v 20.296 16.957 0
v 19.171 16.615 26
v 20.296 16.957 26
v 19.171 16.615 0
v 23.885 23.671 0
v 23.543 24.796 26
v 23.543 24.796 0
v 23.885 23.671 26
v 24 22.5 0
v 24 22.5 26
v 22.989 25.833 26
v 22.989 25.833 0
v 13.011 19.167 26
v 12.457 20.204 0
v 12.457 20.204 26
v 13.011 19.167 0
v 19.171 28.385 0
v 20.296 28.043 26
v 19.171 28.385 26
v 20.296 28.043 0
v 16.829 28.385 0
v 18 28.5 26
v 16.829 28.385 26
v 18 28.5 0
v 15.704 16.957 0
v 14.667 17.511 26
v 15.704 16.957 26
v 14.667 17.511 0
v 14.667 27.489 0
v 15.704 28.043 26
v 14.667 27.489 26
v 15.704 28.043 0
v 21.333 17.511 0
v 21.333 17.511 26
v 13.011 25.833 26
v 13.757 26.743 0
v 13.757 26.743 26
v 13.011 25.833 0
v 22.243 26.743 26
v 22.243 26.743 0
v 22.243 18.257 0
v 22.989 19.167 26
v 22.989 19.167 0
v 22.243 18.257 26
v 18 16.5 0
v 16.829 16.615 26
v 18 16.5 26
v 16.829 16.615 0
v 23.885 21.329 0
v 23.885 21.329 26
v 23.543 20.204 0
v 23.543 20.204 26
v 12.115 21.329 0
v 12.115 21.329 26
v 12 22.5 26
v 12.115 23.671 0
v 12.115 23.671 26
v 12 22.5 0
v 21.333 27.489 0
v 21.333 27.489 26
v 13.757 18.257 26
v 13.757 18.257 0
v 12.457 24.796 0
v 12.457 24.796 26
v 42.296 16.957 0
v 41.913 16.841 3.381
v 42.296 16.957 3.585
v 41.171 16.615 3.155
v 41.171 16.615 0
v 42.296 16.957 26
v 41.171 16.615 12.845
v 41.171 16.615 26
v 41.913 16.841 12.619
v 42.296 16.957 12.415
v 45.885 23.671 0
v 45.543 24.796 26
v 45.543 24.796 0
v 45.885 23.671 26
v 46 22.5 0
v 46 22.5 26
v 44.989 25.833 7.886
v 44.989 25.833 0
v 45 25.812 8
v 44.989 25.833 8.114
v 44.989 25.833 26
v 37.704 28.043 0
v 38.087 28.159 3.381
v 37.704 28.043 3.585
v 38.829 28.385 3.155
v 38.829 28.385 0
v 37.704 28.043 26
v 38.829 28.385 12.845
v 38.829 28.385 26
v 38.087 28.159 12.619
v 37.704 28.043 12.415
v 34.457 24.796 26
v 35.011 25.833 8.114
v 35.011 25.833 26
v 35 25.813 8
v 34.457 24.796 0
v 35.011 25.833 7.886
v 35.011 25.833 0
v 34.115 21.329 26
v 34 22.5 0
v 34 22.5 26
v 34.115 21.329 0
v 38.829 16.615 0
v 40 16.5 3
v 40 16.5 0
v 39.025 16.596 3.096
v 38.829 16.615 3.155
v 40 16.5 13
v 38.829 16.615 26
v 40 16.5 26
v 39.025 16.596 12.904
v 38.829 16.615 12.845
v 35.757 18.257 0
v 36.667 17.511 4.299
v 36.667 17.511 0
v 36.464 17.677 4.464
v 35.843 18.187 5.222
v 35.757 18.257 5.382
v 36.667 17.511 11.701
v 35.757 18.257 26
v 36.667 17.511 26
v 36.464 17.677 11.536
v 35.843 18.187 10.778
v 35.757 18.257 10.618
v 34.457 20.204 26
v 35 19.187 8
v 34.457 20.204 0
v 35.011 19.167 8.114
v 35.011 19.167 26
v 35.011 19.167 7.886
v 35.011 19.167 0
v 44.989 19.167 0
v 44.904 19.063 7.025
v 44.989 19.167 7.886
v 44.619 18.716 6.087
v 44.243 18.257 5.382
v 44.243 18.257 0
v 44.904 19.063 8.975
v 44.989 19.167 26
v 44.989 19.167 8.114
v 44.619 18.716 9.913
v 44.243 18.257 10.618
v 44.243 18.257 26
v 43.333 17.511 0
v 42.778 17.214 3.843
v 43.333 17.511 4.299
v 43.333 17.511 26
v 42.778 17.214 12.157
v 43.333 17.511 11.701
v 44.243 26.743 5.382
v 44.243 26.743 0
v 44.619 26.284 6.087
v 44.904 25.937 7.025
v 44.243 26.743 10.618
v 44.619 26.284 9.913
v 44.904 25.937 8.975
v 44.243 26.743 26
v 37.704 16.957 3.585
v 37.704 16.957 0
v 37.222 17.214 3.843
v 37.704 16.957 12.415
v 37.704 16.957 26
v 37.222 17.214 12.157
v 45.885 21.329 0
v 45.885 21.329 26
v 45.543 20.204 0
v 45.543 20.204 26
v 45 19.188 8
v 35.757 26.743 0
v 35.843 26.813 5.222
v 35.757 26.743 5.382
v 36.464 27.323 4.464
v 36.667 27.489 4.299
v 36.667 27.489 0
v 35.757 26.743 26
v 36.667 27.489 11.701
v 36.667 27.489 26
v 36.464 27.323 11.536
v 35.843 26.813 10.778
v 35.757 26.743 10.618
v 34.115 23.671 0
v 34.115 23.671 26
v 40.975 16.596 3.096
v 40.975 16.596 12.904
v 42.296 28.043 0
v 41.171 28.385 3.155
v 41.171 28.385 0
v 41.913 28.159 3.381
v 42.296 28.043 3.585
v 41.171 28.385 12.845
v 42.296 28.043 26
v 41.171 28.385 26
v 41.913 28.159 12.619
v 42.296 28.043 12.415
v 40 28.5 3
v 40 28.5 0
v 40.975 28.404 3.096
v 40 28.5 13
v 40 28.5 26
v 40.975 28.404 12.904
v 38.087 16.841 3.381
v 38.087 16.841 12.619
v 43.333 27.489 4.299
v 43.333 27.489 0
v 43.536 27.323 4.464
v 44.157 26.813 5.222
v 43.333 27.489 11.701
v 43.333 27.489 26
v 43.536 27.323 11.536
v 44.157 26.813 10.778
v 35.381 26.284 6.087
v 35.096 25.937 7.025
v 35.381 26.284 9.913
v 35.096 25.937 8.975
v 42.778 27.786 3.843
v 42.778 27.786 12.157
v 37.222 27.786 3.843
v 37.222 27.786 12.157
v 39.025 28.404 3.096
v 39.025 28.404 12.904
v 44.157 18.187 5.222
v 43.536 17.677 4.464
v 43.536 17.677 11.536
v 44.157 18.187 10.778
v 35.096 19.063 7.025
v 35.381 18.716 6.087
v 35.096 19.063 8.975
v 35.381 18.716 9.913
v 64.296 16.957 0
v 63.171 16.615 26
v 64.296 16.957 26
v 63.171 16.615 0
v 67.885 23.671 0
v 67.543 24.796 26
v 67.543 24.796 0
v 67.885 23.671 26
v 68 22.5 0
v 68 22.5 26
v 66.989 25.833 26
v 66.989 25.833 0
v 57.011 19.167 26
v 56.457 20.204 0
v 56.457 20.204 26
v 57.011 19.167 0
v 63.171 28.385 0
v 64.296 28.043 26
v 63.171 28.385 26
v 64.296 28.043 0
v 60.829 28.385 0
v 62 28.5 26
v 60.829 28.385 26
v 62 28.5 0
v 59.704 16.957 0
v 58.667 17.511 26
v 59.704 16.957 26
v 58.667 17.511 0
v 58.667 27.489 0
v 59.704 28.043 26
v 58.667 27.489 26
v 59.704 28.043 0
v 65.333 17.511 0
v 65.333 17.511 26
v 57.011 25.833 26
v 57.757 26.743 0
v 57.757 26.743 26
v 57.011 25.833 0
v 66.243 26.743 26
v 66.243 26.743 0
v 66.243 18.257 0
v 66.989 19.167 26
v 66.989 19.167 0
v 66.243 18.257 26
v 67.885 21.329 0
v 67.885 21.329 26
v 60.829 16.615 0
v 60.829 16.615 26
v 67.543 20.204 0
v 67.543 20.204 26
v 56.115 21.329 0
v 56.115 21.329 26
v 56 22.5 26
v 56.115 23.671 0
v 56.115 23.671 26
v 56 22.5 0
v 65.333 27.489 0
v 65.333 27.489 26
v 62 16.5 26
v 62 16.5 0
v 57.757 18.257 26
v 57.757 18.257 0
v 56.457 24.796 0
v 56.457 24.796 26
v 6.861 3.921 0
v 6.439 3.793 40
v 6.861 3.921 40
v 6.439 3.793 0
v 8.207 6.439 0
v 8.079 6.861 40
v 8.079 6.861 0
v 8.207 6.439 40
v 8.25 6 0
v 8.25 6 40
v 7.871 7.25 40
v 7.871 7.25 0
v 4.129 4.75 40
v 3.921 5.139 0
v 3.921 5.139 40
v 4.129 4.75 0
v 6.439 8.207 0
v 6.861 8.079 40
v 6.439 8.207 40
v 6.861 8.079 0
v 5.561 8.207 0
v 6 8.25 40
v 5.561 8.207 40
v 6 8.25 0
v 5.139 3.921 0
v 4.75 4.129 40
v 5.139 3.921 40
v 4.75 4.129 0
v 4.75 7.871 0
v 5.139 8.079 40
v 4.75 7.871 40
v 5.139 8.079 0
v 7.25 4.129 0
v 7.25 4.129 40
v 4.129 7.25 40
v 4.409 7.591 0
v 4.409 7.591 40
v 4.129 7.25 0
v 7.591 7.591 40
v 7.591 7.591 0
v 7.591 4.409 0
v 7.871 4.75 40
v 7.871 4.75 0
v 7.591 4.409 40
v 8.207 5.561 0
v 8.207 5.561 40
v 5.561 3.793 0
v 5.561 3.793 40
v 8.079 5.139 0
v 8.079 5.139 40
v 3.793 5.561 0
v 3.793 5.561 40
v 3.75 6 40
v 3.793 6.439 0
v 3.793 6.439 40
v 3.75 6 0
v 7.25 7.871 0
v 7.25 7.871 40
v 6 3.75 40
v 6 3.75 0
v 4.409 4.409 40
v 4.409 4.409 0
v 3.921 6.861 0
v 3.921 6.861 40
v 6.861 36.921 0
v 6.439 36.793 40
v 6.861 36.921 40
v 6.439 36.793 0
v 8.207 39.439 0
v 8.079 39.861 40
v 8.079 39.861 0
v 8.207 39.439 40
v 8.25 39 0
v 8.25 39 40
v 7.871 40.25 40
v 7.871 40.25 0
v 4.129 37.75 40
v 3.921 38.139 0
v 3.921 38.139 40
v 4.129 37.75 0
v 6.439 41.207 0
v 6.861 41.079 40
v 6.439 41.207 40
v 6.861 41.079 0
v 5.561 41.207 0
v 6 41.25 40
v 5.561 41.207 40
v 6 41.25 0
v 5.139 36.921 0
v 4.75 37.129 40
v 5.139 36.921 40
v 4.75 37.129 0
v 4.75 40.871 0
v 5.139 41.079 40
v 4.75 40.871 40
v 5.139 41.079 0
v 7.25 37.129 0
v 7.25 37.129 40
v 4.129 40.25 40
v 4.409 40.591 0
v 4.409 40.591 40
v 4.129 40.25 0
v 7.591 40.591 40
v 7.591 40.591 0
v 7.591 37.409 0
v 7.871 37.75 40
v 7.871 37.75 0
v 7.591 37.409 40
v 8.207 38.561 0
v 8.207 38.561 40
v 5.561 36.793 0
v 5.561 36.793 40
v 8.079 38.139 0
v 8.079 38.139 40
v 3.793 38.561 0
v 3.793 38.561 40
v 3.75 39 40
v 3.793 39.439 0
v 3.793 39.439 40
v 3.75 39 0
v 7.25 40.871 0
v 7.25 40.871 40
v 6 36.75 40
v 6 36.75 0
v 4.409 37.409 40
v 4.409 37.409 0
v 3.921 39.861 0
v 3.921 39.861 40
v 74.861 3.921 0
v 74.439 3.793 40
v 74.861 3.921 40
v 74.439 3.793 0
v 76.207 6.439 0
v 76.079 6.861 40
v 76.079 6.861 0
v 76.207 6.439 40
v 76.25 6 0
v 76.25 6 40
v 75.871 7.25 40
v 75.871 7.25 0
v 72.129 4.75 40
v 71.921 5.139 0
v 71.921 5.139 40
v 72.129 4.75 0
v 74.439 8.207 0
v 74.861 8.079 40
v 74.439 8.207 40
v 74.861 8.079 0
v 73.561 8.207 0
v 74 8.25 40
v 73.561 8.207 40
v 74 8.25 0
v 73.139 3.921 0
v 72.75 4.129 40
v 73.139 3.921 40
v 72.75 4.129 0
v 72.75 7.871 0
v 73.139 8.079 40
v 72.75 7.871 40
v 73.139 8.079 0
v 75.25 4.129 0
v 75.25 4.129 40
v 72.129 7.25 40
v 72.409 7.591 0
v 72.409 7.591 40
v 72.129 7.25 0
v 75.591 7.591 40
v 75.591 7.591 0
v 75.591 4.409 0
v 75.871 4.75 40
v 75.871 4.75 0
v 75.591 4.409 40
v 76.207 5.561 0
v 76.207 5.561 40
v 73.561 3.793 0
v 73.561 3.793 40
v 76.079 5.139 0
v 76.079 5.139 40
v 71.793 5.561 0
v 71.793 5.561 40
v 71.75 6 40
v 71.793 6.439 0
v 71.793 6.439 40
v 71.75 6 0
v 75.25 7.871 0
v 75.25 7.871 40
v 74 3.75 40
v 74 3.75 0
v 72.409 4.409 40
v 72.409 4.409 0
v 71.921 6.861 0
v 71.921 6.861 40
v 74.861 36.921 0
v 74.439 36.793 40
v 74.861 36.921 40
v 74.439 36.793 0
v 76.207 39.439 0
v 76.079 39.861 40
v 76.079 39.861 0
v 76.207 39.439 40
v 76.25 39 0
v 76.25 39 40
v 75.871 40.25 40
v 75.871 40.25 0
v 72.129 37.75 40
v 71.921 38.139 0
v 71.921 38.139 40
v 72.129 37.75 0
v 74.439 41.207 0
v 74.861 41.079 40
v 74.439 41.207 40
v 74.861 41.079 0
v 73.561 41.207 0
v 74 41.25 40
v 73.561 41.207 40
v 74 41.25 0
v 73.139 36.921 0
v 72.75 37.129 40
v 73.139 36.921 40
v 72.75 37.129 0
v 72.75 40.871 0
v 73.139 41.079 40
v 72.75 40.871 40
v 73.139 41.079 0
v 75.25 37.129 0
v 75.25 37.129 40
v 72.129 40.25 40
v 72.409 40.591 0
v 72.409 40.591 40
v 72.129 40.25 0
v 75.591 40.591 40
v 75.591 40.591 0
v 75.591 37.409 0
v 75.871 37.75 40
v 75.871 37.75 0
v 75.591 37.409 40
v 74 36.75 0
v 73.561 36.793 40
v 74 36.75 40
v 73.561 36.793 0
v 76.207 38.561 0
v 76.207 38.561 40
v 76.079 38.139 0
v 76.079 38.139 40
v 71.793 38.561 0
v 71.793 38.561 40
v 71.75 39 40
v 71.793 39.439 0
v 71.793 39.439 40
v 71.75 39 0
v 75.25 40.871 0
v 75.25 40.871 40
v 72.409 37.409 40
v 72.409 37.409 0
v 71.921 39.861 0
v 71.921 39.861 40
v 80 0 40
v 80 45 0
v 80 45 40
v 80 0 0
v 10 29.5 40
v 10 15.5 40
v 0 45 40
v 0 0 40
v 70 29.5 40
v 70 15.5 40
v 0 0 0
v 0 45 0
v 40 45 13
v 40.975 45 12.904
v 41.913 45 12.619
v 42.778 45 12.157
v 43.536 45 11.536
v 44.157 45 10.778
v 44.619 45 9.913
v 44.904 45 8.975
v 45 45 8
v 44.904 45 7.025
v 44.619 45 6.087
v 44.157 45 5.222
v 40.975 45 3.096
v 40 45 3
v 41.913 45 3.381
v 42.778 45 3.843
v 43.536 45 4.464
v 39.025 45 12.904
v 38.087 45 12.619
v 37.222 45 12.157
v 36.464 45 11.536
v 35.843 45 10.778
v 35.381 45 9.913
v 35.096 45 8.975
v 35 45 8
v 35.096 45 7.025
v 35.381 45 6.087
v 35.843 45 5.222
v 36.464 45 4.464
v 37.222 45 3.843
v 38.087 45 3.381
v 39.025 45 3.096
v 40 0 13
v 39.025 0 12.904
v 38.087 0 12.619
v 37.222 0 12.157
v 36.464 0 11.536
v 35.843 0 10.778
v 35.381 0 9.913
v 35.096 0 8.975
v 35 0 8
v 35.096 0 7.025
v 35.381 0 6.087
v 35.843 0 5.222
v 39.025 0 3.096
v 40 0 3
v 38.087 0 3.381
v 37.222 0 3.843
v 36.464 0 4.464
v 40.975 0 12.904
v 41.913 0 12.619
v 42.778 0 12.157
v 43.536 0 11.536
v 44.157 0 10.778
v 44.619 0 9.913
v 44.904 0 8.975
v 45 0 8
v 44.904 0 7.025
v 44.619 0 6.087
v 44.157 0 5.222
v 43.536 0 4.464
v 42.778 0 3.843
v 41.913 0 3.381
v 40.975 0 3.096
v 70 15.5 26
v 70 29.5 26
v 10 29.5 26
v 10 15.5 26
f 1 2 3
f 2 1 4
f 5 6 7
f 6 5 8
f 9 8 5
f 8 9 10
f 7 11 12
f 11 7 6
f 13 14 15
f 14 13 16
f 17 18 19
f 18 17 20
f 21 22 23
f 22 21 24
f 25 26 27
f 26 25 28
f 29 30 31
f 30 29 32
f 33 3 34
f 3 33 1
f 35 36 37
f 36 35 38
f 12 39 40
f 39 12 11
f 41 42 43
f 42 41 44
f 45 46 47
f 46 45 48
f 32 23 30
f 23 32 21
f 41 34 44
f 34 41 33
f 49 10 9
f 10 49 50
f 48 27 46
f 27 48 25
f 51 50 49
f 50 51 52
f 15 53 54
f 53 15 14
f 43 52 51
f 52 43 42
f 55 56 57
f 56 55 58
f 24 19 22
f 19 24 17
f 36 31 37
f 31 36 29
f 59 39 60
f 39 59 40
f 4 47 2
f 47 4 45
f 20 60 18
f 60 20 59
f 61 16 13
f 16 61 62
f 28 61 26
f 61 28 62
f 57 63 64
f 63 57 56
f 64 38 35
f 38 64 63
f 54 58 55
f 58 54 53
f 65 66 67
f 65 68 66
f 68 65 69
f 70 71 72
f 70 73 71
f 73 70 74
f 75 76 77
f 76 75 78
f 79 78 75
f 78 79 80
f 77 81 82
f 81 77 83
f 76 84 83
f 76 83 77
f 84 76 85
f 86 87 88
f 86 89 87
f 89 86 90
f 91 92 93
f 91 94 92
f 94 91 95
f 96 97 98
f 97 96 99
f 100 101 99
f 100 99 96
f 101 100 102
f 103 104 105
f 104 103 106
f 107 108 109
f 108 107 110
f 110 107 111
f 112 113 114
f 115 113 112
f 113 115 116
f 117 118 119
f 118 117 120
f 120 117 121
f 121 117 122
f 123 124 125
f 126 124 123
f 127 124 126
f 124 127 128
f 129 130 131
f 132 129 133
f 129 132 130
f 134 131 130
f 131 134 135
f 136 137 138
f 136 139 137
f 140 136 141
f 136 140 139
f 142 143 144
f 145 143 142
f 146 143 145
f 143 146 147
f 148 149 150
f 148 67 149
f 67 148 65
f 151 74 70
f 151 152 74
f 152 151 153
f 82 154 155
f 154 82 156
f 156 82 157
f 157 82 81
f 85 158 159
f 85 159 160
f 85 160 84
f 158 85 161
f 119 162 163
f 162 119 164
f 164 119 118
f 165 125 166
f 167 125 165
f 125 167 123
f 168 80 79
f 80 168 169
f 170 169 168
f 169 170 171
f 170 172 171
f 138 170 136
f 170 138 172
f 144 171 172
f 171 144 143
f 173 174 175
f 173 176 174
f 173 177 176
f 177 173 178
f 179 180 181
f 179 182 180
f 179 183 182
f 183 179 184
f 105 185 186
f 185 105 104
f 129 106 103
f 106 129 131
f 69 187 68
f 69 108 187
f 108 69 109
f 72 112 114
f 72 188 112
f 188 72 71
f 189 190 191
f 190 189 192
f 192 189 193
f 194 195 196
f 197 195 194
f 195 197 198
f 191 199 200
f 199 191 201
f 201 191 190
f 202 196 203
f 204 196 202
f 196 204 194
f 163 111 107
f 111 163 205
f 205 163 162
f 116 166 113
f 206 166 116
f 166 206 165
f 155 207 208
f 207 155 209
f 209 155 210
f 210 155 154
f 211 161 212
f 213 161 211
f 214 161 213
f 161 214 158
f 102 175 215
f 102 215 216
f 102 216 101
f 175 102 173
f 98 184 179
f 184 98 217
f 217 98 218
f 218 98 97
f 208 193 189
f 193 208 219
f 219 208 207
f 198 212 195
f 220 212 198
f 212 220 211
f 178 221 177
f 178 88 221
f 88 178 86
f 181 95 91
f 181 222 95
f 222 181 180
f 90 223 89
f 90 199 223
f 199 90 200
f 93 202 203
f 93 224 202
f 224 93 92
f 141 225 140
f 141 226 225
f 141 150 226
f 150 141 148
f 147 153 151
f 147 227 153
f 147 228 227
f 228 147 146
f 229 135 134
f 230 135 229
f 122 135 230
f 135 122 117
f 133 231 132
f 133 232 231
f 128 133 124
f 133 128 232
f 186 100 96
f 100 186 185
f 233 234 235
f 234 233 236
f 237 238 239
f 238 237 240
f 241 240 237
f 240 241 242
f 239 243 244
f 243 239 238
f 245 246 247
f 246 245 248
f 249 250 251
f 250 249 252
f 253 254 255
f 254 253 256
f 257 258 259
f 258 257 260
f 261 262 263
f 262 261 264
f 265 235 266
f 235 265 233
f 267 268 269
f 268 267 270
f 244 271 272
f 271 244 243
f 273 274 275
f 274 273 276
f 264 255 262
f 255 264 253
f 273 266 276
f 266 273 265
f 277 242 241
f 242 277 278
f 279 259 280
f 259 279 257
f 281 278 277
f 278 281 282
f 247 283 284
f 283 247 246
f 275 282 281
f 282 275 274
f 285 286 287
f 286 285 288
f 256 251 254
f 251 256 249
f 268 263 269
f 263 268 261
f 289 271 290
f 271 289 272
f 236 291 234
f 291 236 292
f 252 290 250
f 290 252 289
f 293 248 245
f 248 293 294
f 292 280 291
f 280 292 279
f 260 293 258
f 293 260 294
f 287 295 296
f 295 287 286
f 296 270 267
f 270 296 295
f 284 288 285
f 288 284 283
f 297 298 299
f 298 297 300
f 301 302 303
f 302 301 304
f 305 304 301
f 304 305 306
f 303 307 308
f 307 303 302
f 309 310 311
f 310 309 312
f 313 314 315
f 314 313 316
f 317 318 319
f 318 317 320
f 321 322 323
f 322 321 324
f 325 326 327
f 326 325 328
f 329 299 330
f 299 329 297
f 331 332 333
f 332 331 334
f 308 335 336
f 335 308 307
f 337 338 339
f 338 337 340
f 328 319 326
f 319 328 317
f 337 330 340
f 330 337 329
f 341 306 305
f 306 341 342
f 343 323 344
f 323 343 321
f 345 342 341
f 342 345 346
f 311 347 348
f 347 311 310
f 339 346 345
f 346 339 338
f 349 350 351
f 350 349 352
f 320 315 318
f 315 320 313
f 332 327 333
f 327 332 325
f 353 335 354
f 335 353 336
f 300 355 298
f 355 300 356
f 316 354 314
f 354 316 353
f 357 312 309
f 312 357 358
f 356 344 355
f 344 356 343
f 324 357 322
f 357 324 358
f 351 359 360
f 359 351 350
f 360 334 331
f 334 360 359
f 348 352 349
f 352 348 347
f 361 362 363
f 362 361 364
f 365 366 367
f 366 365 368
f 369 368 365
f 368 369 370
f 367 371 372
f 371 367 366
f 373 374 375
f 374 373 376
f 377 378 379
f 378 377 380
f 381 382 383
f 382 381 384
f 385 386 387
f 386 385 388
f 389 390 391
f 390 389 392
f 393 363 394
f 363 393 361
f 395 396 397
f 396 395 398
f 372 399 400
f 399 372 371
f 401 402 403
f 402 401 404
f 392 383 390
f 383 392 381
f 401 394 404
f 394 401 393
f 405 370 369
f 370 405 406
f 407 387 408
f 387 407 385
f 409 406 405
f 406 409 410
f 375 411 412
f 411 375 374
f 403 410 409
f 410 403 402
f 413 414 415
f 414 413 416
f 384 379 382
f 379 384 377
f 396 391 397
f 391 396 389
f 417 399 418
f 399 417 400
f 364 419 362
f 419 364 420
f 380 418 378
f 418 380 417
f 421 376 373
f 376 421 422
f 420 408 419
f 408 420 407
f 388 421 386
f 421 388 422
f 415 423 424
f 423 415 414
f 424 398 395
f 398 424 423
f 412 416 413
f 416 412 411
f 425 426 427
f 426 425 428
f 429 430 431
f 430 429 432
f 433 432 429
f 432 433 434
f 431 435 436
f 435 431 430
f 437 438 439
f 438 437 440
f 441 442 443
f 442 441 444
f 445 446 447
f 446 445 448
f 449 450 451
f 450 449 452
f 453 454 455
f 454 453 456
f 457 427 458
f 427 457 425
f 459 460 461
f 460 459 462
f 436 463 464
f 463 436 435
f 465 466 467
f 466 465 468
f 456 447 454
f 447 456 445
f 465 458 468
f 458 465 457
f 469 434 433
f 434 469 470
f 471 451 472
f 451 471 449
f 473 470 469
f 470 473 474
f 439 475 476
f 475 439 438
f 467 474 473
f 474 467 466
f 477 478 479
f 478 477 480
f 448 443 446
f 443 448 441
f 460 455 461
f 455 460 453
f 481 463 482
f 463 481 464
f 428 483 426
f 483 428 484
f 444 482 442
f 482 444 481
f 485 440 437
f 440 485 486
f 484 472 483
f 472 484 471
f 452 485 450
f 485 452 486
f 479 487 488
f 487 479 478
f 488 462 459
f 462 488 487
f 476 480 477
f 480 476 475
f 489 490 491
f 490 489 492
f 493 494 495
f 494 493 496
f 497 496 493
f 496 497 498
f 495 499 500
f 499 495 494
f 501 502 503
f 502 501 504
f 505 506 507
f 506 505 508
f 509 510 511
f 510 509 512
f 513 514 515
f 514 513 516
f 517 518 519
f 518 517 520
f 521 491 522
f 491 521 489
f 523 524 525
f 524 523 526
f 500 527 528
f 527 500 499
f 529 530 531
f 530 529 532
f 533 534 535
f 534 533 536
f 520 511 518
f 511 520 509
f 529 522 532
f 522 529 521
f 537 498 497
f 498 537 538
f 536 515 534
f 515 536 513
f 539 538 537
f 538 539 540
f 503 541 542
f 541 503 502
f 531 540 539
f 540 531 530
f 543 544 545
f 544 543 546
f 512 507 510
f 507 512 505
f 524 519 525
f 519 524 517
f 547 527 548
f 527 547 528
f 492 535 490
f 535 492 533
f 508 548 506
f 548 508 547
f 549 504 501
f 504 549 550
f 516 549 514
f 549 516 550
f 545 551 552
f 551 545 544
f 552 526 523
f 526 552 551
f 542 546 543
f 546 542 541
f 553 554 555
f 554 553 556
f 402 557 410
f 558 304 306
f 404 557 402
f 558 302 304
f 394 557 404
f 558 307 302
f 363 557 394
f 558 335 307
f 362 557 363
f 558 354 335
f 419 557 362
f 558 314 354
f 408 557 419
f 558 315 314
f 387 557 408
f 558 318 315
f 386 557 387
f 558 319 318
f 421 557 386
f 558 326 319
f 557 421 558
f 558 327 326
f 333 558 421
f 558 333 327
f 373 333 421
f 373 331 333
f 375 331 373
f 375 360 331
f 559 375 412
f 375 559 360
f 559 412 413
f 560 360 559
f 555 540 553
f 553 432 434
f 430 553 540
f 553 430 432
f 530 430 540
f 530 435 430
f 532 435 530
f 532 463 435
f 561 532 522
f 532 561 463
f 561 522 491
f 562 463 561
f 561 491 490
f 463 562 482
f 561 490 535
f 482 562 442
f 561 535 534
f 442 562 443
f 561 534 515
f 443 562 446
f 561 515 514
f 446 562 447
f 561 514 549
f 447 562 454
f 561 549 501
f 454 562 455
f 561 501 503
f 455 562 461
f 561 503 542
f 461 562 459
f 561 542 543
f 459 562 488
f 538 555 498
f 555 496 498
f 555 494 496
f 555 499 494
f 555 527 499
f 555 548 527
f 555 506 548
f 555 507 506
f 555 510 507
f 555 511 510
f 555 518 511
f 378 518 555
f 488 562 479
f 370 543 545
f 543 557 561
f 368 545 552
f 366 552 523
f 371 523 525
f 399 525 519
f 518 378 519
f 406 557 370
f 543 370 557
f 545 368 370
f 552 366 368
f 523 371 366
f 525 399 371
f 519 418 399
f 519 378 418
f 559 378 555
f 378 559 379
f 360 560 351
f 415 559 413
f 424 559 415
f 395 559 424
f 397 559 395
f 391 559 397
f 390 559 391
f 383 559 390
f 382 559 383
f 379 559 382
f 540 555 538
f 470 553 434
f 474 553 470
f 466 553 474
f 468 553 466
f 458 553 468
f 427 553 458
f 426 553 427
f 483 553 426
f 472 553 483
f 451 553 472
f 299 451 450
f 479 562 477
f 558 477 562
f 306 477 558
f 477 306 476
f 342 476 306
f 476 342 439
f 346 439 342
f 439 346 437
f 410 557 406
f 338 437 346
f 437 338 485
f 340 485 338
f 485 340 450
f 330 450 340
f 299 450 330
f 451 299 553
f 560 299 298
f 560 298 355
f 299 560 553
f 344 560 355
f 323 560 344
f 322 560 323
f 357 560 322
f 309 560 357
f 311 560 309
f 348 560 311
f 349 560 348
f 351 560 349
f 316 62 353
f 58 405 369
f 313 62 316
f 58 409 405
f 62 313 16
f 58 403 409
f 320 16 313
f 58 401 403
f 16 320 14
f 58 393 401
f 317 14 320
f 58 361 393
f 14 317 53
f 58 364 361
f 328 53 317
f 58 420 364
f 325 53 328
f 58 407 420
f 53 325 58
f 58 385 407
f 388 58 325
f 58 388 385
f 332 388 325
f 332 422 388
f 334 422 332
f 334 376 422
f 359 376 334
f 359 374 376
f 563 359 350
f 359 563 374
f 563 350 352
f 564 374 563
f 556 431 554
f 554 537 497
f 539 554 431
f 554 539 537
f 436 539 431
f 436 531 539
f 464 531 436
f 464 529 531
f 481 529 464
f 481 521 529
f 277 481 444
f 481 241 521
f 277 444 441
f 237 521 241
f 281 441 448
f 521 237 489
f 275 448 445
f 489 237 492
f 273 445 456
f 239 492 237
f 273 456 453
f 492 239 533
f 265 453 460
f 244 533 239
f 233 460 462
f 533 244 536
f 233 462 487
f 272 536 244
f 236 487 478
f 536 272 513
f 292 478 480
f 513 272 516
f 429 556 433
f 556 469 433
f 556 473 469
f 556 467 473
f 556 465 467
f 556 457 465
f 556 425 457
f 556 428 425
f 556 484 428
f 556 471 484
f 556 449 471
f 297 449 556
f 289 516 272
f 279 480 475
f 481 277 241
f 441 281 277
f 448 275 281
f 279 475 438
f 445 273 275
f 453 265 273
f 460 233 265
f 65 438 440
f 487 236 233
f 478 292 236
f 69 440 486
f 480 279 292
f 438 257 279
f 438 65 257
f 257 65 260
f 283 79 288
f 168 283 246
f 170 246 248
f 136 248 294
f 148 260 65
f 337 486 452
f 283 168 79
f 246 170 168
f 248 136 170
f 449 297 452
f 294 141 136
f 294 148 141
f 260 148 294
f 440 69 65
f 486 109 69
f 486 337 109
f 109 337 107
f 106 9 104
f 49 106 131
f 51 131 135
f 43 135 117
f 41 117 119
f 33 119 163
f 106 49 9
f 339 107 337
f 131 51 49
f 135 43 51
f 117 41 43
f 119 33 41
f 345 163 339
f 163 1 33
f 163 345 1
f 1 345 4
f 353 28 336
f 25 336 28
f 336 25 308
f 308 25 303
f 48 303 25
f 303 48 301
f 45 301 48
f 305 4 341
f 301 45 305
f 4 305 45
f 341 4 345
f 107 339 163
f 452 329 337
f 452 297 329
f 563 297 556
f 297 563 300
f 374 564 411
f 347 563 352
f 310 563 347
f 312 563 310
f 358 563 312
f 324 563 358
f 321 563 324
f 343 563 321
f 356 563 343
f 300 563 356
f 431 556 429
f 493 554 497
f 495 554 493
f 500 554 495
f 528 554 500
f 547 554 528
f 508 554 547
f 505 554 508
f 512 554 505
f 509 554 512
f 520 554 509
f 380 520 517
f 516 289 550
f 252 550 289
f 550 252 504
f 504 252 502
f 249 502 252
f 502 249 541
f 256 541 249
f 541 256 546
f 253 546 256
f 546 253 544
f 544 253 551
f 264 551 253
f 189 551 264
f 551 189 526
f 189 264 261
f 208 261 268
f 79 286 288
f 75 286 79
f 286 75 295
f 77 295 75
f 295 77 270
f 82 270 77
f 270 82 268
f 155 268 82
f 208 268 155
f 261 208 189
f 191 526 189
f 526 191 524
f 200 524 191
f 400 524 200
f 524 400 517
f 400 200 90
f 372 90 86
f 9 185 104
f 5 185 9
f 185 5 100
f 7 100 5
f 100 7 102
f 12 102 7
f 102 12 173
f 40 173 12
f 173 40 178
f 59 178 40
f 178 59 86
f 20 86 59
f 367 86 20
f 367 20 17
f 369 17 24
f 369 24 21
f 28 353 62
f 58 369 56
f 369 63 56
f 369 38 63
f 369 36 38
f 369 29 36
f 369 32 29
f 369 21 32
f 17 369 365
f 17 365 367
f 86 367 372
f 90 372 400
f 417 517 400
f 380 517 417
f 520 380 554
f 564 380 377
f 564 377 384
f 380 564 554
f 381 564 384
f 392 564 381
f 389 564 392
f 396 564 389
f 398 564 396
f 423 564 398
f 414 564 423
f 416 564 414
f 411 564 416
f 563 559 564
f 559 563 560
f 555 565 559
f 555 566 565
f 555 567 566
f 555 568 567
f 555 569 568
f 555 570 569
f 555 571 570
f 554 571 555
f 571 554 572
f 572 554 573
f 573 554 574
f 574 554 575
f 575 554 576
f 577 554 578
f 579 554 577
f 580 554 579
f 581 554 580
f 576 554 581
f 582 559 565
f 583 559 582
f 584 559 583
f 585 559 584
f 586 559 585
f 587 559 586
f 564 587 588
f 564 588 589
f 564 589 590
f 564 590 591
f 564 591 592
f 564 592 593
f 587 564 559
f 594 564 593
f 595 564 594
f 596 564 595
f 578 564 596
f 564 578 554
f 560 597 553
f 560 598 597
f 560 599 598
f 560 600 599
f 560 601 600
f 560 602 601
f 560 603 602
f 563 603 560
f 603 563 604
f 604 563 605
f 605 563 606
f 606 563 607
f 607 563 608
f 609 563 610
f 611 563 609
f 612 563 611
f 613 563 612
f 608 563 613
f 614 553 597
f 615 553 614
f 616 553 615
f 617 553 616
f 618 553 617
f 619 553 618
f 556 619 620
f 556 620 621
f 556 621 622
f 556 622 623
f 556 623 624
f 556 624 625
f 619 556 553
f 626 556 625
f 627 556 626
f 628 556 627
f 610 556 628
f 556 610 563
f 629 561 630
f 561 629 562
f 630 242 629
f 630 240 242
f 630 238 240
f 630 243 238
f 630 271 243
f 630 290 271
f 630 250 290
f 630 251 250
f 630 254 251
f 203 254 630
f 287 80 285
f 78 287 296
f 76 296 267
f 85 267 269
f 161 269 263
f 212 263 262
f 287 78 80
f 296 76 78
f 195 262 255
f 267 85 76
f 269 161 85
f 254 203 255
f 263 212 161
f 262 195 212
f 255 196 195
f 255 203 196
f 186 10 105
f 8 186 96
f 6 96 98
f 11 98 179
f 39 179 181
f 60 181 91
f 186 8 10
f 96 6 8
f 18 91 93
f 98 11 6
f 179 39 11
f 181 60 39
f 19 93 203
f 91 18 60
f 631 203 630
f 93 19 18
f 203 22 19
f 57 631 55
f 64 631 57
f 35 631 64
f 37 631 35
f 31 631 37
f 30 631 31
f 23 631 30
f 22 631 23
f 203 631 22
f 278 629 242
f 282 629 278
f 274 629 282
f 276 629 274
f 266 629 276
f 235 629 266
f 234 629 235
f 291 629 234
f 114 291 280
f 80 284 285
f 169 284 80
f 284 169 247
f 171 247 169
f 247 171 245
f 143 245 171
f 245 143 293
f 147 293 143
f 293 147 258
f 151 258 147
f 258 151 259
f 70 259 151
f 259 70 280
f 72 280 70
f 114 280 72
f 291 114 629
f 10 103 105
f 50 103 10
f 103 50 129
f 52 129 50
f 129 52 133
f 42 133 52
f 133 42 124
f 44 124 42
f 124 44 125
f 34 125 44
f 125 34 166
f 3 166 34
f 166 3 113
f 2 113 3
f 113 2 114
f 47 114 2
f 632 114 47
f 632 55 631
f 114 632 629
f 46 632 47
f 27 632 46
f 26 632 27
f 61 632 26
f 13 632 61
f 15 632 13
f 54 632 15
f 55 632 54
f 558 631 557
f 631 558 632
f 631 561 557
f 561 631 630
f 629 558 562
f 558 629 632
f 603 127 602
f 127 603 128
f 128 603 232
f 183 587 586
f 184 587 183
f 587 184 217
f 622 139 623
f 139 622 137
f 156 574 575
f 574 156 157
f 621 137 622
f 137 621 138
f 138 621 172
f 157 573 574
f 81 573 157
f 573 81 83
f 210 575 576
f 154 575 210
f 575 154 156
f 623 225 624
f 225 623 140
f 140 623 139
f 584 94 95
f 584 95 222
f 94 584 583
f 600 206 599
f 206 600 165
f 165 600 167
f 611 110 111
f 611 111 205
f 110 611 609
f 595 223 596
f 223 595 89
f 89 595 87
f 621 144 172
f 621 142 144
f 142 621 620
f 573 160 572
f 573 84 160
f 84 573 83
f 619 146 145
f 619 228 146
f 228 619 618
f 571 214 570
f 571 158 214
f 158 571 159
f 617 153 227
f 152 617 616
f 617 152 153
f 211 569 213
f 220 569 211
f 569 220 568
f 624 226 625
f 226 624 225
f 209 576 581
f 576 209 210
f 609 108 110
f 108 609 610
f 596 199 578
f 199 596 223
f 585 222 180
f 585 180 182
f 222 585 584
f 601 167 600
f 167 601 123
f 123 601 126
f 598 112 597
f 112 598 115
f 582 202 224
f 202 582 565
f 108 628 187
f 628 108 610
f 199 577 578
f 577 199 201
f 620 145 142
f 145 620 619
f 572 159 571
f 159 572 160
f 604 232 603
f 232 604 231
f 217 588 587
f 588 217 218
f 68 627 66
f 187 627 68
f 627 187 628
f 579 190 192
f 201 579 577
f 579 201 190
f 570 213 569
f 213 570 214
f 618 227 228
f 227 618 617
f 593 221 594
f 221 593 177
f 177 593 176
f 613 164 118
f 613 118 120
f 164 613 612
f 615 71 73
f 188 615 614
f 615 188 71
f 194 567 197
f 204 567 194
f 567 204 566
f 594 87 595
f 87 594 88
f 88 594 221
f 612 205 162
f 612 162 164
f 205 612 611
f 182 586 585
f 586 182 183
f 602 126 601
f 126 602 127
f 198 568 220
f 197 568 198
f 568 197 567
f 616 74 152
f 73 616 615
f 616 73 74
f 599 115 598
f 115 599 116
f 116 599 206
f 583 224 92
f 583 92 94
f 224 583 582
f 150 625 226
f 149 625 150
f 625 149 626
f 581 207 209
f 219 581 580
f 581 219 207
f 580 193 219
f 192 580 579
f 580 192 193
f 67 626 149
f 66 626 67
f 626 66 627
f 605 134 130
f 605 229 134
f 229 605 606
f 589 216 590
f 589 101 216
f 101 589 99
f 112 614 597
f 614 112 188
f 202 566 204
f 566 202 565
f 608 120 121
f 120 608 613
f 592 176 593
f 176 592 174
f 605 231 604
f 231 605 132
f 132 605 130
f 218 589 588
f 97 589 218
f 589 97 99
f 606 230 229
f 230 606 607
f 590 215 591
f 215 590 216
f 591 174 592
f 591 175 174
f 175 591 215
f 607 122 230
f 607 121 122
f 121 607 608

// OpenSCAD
$fn = 32;

// ----------------------------------------------------------------------
// Manifold block: side_outlet manifold
// ----------------------------------------------------------------------

// --- parameters (mm) ---
block_l = 80;             // block length, X
block_w = 45;             // block width, Y
block_h = 40;             // block height, Z
port_d = 12;              // port bore diameter
port_pitch = 22;          // port pitch along X
gallery_d = 14;           // top gallery width, Y
gallery_depth = 14;       // gallery pocket depth
wall_p = 10;              // gallery end wall thickness, X
mnt_d = 4.5;              // mounting hole diameter
mnt_in = 6;               // mounting hole inset from the edges
out_d = 10;               // outlet bore diameter
out_z = 8;                // outlet axis height

n_ports = 3;  // ports in the row
port_x0 = (block_l - (n_ports - 1) * port_pitch) / 2;  // first port X

difference() {
  cube([block_l, block_w, block_h]);
  for (i = [0 : n_ports - 1])
    translate([port_x0 + i * port_pitch, block_w / 2, -1])
      cylinder(h = block_h + 2, d = port_d);
  translate([wall_p, block_w / 2 - gallery_d / 2, block_h - gallery_depth])
    cube([block_l - 2 * wall_p, gallery_d, gallery_depth + 1]);
  for (cx = [mnt_in, block_l - mnt_in])
    for (cy = [mnt_in, block_w - mnt_in])
      translate([cx, cy, -1]) cylinder(h = block_h + 2, d = mnt_d);
  translate([block_l / 2, -1, out_z]) rotate([-90, 0, 0])
    cylinder(h = block_w + 2, d = out_d);
}
